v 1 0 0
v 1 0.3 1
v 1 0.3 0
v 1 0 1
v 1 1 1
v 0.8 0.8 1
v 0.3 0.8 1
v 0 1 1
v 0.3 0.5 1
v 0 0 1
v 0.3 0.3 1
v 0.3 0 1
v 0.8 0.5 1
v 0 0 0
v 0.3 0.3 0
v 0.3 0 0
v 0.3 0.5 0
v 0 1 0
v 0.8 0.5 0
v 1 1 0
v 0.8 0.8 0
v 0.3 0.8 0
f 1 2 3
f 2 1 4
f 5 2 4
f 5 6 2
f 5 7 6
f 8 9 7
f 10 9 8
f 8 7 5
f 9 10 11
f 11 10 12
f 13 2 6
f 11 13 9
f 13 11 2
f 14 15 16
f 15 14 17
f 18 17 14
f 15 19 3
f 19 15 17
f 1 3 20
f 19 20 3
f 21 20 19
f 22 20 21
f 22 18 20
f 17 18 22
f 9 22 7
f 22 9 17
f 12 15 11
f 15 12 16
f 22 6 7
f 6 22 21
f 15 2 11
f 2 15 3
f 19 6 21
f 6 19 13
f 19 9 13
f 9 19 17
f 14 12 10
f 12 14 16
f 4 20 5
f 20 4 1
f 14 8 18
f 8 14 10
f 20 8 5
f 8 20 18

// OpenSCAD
difference() {
  translate([0.5000000000, 0.5000000000, 0.5000000000]) {
    translate([-0.5000000000, -0.5000000000, -0.5000000000]) {
      cube([1, 1, 1]);
    }
  }
  difference() {
    translate([0.6499993500, 0.4000000000, 0.5000000000]) {
      scale([0.7000000000, 0.8000000000, 1.0000000000]) {
        translate([-0.5000000000, -0.5000000000, -0.5000000000]) {
          cube([1, 1, 1]);
        }
      }
    }
    difference() {
      translate([0.6499993500, 0.5500000000, 0.5000000000]) {
        scale([0.7000000000, 0.5000000000, 1.0000000000]) {
          translate([-0.5000000000, -0.5000000000, -0.5000000000]) {
            cube([1, 1, 1]);
          }
        }
      }
      translate([0.5499990000, 0.6499995000, 0.5000000000]) {
        scale([0.5000000000, 0.3000000000, 1.0000000000]) {
          translate([-0.5000000000, -0.5000000000, -0.5000000000]) {
            cube([1, 1, 1]);
          }
        }
      }
    }
  }
}
